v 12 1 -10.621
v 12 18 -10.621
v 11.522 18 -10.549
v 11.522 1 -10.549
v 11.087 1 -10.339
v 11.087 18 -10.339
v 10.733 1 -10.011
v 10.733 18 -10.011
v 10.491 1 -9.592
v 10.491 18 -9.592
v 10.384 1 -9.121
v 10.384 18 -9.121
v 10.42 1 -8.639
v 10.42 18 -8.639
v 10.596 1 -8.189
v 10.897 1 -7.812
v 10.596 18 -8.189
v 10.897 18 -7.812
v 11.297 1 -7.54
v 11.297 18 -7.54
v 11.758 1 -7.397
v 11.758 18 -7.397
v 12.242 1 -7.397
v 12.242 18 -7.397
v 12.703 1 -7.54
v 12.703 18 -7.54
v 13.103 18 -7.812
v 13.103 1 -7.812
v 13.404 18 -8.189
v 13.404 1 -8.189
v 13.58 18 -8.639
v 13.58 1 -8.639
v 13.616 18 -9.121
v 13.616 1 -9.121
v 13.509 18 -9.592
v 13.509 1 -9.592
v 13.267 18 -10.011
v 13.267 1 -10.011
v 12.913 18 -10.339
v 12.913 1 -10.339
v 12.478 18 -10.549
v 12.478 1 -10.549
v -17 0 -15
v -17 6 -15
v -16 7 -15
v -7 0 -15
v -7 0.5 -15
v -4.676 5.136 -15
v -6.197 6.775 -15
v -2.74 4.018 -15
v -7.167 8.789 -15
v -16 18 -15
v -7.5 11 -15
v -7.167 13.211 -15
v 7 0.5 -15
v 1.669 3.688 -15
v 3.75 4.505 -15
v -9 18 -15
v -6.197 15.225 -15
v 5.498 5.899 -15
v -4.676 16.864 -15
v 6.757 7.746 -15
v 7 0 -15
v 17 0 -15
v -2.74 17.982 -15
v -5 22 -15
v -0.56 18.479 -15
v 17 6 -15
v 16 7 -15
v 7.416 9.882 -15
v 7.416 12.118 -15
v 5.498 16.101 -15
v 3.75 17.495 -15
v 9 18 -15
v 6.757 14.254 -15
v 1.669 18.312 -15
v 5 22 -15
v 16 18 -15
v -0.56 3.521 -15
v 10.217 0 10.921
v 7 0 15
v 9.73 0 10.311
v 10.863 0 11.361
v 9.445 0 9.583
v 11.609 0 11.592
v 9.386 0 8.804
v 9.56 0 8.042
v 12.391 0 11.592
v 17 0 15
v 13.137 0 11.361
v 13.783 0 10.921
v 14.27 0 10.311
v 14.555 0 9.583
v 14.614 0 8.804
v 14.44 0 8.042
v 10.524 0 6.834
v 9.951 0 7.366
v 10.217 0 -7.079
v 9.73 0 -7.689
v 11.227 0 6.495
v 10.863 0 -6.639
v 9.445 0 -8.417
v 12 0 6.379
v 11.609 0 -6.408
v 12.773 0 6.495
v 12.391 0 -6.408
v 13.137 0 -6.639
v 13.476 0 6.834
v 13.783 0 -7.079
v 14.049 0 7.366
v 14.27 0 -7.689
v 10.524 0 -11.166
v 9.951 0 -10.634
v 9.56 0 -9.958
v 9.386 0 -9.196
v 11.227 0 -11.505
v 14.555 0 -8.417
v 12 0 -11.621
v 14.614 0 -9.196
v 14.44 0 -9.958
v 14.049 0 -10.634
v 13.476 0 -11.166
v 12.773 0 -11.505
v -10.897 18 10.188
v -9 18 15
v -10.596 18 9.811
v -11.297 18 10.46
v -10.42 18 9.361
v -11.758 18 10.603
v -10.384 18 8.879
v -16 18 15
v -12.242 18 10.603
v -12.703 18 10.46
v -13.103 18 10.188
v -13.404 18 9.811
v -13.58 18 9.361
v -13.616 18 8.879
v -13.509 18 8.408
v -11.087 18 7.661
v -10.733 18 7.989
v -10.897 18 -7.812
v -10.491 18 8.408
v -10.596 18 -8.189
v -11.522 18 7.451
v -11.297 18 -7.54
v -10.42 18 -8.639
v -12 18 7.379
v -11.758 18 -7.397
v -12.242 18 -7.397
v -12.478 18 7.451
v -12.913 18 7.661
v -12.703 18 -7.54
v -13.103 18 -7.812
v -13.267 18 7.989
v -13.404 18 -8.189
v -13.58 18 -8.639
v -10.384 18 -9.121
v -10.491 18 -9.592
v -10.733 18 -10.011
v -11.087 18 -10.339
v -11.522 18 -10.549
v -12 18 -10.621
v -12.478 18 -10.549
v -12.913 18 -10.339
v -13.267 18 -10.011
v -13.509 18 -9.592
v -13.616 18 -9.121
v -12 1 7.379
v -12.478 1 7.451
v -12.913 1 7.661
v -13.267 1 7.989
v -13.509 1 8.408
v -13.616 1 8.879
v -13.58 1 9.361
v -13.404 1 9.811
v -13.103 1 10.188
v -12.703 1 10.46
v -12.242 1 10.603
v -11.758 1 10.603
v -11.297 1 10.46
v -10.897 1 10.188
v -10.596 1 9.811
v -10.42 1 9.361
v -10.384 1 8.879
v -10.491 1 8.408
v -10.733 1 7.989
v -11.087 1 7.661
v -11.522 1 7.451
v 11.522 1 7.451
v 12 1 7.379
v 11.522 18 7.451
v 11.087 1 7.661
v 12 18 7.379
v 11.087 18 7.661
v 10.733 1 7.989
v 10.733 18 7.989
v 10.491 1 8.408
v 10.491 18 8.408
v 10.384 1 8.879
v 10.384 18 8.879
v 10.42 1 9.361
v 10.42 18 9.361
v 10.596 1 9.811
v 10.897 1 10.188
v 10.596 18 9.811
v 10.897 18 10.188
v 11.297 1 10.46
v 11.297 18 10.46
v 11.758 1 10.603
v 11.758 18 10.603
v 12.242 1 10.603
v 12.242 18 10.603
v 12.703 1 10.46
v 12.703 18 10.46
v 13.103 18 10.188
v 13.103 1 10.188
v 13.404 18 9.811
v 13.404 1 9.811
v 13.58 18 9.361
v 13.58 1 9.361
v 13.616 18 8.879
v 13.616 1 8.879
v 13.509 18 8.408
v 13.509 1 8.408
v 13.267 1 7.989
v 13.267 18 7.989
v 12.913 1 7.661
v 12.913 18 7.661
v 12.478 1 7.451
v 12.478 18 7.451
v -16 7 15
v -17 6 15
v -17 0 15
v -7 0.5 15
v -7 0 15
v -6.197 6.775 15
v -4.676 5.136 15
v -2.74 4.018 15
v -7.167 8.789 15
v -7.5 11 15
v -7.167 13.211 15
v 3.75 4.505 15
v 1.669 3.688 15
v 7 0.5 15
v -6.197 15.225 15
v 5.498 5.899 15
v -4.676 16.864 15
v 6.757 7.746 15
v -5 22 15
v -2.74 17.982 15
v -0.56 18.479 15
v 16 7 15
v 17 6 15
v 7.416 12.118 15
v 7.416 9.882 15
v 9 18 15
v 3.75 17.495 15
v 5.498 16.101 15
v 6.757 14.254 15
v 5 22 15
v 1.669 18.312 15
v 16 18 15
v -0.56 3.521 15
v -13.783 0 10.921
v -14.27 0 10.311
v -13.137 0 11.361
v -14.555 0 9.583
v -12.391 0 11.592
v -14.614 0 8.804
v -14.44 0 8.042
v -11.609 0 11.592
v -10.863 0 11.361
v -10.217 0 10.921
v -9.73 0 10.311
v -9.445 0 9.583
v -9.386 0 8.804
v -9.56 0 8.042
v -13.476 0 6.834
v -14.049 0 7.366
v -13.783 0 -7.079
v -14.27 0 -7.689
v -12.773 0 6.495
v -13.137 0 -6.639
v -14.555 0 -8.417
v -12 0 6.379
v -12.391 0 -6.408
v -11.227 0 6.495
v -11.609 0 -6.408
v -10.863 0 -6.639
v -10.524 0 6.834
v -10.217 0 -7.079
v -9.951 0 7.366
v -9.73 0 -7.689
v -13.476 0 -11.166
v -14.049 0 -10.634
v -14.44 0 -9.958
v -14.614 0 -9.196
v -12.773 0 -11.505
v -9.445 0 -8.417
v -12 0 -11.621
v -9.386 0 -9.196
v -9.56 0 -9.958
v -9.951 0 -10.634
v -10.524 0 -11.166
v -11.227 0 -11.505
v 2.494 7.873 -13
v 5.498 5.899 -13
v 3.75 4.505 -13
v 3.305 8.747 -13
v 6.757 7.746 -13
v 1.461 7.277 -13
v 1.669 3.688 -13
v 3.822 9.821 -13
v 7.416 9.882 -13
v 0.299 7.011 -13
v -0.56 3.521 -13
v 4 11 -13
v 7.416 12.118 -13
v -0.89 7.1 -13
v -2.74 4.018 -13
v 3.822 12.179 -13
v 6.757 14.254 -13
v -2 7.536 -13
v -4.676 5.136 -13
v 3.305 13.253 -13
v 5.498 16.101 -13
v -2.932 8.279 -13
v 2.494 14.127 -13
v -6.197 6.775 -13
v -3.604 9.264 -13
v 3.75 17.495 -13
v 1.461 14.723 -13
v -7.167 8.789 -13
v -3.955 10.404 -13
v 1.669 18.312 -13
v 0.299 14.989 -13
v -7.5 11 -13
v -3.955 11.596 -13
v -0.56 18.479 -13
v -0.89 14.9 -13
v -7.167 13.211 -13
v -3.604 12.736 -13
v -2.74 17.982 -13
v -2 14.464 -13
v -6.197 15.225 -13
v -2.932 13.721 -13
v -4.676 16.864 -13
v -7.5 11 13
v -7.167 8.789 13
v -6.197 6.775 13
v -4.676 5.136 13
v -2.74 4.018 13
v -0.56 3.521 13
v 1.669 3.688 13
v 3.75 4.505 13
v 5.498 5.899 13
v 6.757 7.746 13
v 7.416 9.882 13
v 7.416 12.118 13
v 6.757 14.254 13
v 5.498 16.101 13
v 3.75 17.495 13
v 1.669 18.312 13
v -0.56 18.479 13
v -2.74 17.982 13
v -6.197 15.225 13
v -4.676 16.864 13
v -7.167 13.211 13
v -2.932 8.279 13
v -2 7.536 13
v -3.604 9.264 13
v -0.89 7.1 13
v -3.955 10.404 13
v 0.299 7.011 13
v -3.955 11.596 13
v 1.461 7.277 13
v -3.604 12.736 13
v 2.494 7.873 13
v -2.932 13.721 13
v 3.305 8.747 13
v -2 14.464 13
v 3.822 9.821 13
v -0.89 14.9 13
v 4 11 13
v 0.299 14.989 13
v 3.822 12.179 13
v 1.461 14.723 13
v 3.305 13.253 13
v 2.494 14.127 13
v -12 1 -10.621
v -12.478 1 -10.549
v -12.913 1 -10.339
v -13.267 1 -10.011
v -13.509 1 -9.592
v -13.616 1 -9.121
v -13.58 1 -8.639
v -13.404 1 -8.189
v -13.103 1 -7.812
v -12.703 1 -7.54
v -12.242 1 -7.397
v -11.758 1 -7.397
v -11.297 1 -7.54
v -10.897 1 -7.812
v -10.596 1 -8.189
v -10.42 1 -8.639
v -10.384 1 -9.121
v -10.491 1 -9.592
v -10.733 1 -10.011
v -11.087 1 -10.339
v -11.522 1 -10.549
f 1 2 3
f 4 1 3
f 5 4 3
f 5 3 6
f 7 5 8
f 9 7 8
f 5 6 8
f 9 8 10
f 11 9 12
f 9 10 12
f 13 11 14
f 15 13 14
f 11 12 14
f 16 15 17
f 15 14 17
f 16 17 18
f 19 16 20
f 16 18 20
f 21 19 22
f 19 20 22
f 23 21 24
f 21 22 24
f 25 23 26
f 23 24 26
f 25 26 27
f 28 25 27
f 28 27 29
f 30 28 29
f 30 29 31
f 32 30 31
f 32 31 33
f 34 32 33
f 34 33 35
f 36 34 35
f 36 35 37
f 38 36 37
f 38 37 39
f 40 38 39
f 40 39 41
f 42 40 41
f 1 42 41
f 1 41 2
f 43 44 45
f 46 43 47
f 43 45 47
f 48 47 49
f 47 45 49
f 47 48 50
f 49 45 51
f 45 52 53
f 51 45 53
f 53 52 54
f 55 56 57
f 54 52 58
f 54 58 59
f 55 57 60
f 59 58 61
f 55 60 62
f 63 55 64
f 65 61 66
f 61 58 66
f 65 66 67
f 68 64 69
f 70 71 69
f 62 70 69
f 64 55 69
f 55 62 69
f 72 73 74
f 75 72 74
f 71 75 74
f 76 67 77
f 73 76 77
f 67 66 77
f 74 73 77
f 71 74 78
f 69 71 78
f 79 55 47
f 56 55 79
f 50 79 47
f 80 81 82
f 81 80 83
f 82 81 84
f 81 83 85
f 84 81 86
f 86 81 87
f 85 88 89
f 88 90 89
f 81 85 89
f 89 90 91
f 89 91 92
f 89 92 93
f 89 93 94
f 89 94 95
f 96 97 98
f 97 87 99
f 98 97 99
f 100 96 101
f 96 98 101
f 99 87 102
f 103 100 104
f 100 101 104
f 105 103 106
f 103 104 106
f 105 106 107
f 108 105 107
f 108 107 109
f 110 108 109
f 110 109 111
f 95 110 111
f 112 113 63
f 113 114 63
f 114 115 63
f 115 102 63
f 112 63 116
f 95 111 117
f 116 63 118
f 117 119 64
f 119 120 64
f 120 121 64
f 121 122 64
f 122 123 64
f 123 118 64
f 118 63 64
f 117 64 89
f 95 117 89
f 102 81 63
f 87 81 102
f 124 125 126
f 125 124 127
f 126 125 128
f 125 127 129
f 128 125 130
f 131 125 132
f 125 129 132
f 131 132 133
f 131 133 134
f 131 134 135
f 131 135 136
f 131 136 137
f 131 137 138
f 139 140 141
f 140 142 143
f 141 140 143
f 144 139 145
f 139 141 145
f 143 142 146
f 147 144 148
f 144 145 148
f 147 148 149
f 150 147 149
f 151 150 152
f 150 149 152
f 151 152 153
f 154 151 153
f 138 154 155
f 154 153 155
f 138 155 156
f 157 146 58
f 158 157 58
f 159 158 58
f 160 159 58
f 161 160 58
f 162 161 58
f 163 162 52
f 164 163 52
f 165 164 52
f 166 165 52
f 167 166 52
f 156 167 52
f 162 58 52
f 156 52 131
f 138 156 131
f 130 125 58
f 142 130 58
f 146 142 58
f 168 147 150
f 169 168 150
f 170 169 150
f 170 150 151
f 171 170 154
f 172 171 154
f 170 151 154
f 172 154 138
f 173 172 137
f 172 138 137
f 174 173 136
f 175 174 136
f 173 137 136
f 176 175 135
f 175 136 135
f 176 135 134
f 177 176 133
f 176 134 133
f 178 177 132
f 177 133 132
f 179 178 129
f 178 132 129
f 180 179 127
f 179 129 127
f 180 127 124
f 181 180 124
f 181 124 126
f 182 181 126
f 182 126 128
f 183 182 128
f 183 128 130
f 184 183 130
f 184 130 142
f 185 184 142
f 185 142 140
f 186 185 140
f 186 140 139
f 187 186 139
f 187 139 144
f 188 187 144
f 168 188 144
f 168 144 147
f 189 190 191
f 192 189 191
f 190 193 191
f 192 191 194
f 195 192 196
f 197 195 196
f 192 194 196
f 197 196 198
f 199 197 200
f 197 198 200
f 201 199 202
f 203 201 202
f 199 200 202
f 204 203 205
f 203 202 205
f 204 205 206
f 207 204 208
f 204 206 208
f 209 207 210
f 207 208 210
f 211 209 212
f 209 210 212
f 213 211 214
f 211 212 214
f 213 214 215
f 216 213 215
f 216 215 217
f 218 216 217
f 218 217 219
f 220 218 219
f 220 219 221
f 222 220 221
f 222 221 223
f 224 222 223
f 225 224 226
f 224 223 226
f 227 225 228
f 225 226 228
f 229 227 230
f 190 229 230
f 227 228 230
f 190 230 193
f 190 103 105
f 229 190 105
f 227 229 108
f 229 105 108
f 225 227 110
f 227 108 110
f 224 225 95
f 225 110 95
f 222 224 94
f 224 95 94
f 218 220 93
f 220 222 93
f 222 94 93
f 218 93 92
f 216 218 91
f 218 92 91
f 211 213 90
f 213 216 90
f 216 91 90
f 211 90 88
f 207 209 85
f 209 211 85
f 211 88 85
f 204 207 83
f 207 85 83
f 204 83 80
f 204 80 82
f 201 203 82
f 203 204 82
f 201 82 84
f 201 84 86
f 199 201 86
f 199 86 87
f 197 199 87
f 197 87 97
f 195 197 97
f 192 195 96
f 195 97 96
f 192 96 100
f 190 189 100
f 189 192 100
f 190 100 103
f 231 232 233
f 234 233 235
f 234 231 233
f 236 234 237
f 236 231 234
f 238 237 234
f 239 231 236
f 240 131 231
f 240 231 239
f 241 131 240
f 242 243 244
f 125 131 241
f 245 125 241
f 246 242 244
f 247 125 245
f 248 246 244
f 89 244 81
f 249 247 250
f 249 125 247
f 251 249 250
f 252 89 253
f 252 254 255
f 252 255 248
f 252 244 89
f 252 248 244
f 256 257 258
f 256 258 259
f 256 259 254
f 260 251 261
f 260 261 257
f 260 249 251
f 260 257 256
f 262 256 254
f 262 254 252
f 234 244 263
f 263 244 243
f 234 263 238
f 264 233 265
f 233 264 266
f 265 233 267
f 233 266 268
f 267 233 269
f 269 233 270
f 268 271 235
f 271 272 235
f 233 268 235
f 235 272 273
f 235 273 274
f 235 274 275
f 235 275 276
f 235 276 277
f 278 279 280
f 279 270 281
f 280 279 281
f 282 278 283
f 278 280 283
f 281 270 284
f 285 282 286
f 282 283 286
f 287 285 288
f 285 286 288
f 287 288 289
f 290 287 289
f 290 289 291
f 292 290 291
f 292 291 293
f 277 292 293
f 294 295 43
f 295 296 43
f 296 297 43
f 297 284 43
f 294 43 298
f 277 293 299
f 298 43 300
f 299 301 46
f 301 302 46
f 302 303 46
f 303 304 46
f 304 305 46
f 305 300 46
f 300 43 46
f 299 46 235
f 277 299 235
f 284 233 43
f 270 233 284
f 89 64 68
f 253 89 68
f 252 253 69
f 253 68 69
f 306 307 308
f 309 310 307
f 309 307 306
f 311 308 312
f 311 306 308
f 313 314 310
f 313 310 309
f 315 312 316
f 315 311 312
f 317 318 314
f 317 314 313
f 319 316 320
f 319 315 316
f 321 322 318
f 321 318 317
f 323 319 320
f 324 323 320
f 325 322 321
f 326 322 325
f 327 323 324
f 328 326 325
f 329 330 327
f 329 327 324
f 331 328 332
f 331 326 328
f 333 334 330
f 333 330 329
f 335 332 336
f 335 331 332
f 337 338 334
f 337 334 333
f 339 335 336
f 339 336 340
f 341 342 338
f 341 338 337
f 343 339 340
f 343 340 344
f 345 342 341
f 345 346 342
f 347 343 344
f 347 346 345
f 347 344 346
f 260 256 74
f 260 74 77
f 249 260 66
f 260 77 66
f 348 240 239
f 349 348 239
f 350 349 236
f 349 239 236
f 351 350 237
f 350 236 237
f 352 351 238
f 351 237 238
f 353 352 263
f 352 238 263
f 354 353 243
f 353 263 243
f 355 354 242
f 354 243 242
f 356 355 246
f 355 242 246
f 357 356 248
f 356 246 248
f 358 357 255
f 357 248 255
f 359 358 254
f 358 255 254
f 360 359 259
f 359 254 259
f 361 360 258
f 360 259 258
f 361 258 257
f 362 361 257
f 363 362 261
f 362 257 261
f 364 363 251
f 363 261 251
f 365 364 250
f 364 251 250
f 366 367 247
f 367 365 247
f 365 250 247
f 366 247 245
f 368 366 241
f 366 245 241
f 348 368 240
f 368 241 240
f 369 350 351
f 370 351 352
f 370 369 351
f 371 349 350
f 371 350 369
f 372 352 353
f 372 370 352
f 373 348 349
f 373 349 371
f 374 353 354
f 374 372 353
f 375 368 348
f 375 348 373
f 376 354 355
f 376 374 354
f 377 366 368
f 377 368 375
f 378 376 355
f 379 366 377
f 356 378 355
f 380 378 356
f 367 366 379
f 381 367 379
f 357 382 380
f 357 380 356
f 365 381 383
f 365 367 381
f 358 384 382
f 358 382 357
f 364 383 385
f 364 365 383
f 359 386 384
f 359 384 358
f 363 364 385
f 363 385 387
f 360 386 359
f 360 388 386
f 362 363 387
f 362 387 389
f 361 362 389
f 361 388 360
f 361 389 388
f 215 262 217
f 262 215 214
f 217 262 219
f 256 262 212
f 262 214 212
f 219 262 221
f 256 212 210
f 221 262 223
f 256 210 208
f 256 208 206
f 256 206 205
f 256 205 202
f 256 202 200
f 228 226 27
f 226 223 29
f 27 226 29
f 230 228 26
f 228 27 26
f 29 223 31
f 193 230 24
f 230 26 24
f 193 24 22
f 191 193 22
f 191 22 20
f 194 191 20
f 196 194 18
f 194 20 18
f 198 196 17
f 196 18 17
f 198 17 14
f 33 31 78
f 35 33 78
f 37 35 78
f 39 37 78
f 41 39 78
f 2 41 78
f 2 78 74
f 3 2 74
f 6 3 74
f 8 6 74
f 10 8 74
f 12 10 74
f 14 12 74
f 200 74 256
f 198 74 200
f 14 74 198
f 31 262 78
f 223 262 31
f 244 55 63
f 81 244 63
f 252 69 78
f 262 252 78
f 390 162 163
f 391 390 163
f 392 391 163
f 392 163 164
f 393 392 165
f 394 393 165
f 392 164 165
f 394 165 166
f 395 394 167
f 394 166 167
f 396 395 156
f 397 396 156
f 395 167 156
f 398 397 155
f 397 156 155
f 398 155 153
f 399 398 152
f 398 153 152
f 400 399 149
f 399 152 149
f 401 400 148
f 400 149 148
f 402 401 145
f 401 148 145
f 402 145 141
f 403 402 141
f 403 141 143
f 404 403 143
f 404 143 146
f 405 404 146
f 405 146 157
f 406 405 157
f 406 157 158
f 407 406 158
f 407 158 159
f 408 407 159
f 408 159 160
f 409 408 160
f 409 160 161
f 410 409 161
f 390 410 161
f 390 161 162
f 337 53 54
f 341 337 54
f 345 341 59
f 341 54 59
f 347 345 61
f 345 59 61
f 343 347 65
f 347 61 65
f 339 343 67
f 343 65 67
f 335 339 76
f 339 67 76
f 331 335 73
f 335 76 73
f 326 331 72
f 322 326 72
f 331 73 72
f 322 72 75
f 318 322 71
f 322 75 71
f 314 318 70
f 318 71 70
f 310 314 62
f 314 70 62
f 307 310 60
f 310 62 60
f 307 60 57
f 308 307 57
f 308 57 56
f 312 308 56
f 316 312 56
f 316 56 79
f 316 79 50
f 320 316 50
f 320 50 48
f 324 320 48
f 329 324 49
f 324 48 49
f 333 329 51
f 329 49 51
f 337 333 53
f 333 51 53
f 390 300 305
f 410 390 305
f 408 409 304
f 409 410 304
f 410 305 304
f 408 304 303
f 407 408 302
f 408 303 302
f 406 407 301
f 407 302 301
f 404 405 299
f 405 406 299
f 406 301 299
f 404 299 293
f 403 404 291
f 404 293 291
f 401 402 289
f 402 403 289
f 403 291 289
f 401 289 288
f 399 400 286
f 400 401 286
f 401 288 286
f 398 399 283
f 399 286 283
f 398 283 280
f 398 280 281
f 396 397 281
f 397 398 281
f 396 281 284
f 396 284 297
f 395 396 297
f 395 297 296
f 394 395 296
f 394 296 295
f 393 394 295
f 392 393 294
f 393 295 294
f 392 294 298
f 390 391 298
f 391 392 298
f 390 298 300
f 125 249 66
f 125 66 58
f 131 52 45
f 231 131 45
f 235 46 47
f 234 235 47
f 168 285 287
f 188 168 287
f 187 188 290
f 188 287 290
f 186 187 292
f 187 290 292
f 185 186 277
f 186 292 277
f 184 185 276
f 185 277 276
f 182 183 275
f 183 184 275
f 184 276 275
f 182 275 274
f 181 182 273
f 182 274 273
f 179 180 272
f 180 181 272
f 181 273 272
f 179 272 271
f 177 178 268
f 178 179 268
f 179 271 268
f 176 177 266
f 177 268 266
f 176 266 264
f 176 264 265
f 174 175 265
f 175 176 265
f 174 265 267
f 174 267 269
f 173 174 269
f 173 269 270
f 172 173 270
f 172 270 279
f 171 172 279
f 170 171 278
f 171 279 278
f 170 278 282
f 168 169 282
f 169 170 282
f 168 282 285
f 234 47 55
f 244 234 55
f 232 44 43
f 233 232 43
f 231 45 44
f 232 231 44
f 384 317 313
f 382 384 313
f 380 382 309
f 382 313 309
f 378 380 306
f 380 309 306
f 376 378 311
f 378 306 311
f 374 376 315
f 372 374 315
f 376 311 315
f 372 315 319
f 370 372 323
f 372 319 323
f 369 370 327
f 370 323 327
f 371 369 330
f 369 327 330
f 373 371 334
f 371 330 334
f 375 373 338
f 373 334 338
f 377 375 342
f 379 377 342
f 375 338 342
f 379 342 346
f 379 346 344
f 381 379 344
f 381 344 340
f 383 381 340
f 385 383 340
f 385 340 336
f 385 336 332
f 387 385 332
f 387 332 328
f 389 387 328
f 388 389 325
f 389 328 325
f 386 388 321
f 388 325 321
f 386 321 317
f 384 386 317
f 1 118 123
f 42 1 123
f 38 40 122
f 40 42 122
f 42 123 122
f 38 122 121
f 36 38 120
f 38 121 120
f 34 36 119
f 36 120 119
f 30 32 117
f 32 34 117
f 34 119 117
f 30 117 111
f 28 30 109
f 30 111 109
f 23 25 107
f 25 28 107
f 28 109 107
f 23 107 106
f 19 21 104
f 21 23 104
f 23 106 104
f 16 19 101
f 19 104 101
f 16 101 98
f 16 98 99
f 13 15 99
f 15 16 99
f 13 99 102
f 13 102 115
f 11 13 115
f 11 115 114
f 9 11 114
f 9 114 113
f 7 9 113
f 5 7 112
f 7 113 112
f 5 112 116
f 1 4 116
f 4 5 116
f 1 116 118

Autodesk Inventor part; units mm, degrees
ref_plane "YZ Plane" through (0, 0, 0) normal (1, 0, 0) x (0, 1, 0)
ref_plane "XZ Plane" through (0, 0, 0) normal (0, 1, 0) x (-1, 0, 0)
ref_plane "XY Plane" through (0, 0, 0) normal (0, 0, 1) x (1, 0, 0)
sketch "Sketch1" plane through (0, 0, 0) normal (0, 0, 1) x (1, 0, 0)
  line L0 (-17, 0) -> (-7, 0)
  line L1 (-7, 0) -> (-7, 0.5)
  line L2 (-7, 0.5) -> (7, 0.5)
  line L3 (7, 0.5) -> (7, 0)
  line L4 (7, 0) -> (17, 0)
  line L5 (17, 0) -> (17, 6)
  line L6 (17, 6) -> (16, 7)
  line L7 (16, 7) -> (16, 18)
  line L8 (16, 18) -> (9, 18)
  line L9 (9, 18) -> (5, 22)
  line L10 (5, 22) -> (-5, 22)
  line L11 (-5, 22) -> (-9, 18)
  line L12 (-9, 18) -> (-16, 18)
  line L13 (-16, 18) -> (-16, 7)
  line L14 (-16, 7) -> (-17, 6)
  line L15 (-17, 6) -> (-17, 0)
  line L16 (-23.8, 0) -> (23.8, 0) construction
  line L17 (0, -4.4) -> (0, 26.4) construction
  circle A0 centre (0, 11) radius 4
  line L18 (-7, 0.5) -> (-7, 20) construction
  point P0 (0, 0)
  point P1 (0, 22)
  point P2 (0, 0.5)
  dimension "d0" = 34
  dimension "d1" = 14
  dimension "d2" = 6
  dimension "d3" = 18
  dimension "d5" = 11
  dimension "d6" = 8
  dimension "d7" = 0.5
  dimension "d8" = 45
  dimension "d9" = 45
  dimension "d10" = 1
  dimension "d11" = 1
  dimension "d12" = 6
  dimension "d13" = 45
  dimension "d33" = 22
extrude "Extrusion1" add sketch "Sketch1" along normal mid plane 30
sketch "Sketch2" plane through (0, 0, -15) normal (0, 0, -1) x (-1, 0, 0)
  circle A0 centre (0, 11) radius 4 projected
  circle A1 centre (0, 11) radius 7.5
  point P0 (0, 0)
  dimension "d17" = 15
extrude "Extrusion2" cut sketch "Sketch2" against normal blind 2
mirror "Mirror1" about plane through (0, 0, 0) normal (0, 0, 1) of "Extrusion2"
sketch "Sketch3" plane through (7, 0, 15) normal (0, -1, 0) x (1, 0, 0)
  line L0 (10, -30) -> (10, 0) construction
  line L1 (0, 0) -> (10, 0) construction
  line L2 (0, -30) -> (0, 0) construction
  line L3 (10, -30) -> (0, -30) construction
  line L4 (-14, -30) -> (-14, 0) construction
  line L5 (-24, 0) -> (-14, 0) construction
  line L6 (-24, 0) -> (-24, -30) construction
  line L7 (-14, -30) -> (-24, -30) construction
  line L8 (5, -6) -> (-19, -6) construction
  line L9 (-19, -6) -> (-19, -24) construction
  line L10 (-19, -24) -> (5, -24) construction
  line L11 (5, -24) -> (5, -6) construction
  line L12 (5, -6) -> (-19, -24) construction
  line L13 (-19, -6) -> (5, -24) construction
  point P0 (-7, -15)
  dimension "d21" = 18
  dimension "d29" = 24
hole "Hole1" at (12, 0, -9) at (-12, 0, -9) at (12, 0, 9) at (-12, 0, 9) direction (0, 1, 0) diameter 3.242 end through all thread size "M4x0.7" class "6H" standard "ISO Metric profile"
chamfer "Chamfer1" distance 1 angle 45 4 edges at (12, 0, 10.621) (12, 0, -7.379) (-12, 0, 10.621) (-12, 0, -7.379)
ref_plane "Work Plane1" through (0, 0, 0) normal (0, 0, 1) x (1, 0, 0)
equation "\"d9\" = d8"
equation "\"d11\" = d10"
equation "\"d12\" = d2"
properties part number "cojinete lineal"
